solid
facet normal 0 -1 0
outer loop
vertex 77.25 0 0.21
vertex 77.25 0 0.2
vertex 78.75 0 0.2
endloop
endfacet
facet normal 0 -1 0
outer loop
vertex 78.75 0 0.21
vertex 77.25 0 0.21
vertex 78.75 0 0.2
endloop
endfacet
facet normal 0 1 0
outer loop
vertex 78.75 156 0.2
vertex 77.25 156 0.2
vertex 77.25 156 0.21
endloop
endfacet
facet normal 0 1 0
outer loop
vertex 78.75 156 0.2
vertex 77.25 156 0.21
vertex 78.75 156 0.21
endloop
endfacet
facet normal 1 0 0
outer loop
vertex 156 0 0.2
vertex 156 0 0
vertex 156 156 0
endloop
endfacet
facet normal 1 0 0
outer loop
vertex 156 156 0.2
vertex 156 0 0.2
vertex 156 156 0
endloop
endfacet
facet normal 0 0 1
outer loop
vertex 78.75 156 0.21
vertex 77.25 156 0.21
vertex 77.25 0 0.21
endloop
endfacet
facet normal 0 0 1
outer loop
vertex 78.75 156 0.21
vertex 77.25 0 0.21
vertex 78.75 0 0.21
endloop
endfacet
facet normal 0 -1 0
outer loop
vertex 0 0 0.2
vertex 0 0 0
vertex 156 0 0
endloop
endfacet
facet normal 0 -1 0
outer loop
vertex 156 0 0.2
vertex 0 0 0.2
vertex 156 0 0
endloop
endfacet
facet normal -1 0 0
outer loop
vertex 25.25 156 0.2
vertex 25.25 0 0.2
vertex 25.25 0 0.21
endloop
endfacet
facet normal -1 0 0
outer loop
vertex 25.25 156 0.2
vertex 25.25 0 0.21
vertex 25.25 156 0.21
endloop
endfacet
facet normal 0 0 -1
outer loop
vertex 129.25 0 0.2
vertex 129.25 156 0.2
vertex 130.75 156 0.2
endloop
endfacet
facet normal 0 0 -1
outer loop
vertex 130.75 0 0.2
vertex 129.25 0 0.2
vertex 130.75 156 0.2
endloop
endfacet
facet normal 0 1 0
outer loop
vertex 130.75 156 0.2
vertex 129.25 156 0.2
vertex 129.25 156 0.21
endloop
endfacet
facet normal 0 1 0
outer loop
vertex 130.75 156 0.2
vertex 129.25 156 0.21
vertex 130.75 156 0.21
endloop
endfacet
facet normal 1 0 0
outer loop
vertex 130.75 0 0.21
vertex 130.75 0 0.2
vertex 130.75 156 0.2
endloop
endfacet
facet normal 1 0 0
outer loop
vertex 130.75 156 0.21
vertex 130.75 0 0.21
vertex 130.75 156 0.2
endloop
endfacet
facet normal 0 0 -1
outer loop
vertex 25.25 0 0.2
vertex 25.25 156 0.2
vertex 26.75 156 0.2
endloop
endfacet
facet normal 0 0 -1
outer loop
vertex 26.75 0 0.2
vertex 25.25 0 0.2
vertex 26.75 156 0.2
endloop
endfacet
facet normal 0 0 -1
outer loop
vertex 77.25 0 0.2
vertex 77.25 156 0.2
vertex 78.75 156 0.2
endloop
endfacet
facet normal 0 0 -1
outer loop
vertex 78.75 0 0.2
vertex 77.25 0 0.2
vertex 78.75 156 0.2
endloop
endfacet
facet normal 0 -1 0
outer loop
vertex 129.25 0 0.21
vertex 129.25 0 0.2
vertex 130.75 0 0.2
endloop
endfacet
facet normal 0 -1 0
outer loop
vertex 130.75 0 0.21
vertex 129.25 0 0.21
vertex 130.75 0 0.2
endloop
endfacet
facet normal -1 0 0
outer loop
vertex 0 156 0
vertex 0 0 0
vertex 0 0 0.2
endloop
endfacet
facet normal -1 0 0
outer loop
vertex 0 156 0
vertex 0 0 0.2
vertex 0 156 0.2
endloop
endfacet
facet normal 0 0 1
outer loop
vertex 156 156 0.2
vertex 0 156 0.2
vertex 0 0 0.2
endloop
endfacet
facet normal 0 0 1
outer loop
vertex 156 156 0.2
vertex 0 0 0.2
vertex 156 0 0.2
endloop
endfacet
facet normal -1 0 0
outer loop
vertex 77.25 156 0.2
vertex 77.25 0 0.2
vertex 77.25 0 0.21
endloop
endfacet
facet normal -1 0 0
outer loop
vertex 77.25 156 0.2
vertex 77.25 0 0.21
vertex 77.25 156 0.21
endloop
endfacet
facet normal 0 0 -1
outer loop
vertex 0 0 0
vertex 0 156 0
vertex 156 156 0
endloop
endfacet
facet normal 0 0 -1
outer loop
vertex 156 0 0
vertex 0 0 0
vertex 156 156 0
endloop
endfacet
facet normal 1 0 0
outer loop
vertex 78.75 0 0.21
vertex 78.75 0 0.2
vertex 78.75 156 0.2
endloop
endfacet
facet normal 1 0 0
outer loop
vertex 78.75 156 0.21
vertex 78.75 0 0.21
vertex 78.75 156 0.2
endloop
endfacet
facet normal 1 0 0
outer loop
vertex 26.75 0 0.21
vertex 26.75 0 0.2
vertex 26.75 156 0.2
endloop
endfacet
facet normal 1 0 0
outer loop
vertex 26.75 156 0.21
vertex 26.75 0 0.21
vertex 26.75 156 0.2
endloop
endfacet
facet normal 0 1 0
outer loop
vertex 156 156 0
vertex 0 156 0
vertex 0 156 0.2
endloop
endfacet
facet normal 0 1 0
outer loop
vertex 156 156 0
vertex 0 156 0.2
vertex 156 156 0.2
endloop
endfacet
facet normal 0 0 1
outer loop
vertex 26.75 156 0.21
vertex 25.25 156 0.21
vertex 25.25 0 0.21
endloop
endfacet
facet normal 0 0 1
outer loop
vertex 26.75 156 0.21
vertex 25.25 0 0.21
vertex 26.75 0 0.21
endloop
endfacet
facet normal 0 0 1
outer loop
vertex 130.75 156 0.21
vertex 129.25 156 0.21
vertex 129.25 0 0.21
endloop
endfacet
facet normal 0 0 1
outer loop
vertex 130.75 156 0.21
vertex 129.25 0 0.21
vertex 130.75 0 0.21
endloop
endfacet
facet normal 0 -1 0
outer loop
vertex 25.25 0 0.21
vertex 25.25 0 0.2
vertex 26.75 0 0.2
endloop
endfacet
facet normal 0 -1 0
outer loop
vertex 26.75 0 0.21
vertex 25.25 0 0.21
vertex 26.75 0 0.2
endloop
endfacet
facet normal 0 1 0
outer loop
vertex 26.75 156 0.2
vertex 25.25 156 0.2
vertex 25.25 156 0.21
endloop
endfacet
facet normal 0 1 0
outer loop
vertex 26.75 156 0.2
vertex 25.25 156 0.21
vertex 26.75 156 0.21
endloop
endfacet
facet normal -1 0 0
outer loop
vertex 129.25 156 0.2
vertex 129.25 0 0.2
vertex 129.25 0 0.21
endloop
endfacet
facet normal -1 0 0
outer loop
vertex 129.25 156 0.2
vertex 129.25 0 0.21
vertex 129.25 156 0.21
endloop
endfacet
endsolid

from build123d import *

# Parameters (mm, degrees)
F0_W     = 156
F0_H     = 156
F1_DEPTH = 0.2
F2_W     = 1.5
F2_H     = 156
F3_DEPTH = 0.01


with BuildPart() as f1:
    # F0 (on Top) → F1 (new body)
    with BuildSketch(Plane.XY):
        with Locations((78, 78)):
            Rectangle(F0_W, F0_H)
    extrude(amount=F1_DEPTH)


with BuildPart() as f3:
    # F2 (on face) → F3 (new body)
    with BuildSketch(Plane.XY.offset(0.2)):
        with Locations((26, 78)):
            Rectangle(F2_W, F2_H)
        with Locations((78, 78)):
            Rectangle(F2_W, F2_H)
        with Locations((130, 78)):
            Rectangle(F2_W, F2_H)
    extrude(amount=F3_DEPTH)


solid = Compound([f1.part, f3.part])
